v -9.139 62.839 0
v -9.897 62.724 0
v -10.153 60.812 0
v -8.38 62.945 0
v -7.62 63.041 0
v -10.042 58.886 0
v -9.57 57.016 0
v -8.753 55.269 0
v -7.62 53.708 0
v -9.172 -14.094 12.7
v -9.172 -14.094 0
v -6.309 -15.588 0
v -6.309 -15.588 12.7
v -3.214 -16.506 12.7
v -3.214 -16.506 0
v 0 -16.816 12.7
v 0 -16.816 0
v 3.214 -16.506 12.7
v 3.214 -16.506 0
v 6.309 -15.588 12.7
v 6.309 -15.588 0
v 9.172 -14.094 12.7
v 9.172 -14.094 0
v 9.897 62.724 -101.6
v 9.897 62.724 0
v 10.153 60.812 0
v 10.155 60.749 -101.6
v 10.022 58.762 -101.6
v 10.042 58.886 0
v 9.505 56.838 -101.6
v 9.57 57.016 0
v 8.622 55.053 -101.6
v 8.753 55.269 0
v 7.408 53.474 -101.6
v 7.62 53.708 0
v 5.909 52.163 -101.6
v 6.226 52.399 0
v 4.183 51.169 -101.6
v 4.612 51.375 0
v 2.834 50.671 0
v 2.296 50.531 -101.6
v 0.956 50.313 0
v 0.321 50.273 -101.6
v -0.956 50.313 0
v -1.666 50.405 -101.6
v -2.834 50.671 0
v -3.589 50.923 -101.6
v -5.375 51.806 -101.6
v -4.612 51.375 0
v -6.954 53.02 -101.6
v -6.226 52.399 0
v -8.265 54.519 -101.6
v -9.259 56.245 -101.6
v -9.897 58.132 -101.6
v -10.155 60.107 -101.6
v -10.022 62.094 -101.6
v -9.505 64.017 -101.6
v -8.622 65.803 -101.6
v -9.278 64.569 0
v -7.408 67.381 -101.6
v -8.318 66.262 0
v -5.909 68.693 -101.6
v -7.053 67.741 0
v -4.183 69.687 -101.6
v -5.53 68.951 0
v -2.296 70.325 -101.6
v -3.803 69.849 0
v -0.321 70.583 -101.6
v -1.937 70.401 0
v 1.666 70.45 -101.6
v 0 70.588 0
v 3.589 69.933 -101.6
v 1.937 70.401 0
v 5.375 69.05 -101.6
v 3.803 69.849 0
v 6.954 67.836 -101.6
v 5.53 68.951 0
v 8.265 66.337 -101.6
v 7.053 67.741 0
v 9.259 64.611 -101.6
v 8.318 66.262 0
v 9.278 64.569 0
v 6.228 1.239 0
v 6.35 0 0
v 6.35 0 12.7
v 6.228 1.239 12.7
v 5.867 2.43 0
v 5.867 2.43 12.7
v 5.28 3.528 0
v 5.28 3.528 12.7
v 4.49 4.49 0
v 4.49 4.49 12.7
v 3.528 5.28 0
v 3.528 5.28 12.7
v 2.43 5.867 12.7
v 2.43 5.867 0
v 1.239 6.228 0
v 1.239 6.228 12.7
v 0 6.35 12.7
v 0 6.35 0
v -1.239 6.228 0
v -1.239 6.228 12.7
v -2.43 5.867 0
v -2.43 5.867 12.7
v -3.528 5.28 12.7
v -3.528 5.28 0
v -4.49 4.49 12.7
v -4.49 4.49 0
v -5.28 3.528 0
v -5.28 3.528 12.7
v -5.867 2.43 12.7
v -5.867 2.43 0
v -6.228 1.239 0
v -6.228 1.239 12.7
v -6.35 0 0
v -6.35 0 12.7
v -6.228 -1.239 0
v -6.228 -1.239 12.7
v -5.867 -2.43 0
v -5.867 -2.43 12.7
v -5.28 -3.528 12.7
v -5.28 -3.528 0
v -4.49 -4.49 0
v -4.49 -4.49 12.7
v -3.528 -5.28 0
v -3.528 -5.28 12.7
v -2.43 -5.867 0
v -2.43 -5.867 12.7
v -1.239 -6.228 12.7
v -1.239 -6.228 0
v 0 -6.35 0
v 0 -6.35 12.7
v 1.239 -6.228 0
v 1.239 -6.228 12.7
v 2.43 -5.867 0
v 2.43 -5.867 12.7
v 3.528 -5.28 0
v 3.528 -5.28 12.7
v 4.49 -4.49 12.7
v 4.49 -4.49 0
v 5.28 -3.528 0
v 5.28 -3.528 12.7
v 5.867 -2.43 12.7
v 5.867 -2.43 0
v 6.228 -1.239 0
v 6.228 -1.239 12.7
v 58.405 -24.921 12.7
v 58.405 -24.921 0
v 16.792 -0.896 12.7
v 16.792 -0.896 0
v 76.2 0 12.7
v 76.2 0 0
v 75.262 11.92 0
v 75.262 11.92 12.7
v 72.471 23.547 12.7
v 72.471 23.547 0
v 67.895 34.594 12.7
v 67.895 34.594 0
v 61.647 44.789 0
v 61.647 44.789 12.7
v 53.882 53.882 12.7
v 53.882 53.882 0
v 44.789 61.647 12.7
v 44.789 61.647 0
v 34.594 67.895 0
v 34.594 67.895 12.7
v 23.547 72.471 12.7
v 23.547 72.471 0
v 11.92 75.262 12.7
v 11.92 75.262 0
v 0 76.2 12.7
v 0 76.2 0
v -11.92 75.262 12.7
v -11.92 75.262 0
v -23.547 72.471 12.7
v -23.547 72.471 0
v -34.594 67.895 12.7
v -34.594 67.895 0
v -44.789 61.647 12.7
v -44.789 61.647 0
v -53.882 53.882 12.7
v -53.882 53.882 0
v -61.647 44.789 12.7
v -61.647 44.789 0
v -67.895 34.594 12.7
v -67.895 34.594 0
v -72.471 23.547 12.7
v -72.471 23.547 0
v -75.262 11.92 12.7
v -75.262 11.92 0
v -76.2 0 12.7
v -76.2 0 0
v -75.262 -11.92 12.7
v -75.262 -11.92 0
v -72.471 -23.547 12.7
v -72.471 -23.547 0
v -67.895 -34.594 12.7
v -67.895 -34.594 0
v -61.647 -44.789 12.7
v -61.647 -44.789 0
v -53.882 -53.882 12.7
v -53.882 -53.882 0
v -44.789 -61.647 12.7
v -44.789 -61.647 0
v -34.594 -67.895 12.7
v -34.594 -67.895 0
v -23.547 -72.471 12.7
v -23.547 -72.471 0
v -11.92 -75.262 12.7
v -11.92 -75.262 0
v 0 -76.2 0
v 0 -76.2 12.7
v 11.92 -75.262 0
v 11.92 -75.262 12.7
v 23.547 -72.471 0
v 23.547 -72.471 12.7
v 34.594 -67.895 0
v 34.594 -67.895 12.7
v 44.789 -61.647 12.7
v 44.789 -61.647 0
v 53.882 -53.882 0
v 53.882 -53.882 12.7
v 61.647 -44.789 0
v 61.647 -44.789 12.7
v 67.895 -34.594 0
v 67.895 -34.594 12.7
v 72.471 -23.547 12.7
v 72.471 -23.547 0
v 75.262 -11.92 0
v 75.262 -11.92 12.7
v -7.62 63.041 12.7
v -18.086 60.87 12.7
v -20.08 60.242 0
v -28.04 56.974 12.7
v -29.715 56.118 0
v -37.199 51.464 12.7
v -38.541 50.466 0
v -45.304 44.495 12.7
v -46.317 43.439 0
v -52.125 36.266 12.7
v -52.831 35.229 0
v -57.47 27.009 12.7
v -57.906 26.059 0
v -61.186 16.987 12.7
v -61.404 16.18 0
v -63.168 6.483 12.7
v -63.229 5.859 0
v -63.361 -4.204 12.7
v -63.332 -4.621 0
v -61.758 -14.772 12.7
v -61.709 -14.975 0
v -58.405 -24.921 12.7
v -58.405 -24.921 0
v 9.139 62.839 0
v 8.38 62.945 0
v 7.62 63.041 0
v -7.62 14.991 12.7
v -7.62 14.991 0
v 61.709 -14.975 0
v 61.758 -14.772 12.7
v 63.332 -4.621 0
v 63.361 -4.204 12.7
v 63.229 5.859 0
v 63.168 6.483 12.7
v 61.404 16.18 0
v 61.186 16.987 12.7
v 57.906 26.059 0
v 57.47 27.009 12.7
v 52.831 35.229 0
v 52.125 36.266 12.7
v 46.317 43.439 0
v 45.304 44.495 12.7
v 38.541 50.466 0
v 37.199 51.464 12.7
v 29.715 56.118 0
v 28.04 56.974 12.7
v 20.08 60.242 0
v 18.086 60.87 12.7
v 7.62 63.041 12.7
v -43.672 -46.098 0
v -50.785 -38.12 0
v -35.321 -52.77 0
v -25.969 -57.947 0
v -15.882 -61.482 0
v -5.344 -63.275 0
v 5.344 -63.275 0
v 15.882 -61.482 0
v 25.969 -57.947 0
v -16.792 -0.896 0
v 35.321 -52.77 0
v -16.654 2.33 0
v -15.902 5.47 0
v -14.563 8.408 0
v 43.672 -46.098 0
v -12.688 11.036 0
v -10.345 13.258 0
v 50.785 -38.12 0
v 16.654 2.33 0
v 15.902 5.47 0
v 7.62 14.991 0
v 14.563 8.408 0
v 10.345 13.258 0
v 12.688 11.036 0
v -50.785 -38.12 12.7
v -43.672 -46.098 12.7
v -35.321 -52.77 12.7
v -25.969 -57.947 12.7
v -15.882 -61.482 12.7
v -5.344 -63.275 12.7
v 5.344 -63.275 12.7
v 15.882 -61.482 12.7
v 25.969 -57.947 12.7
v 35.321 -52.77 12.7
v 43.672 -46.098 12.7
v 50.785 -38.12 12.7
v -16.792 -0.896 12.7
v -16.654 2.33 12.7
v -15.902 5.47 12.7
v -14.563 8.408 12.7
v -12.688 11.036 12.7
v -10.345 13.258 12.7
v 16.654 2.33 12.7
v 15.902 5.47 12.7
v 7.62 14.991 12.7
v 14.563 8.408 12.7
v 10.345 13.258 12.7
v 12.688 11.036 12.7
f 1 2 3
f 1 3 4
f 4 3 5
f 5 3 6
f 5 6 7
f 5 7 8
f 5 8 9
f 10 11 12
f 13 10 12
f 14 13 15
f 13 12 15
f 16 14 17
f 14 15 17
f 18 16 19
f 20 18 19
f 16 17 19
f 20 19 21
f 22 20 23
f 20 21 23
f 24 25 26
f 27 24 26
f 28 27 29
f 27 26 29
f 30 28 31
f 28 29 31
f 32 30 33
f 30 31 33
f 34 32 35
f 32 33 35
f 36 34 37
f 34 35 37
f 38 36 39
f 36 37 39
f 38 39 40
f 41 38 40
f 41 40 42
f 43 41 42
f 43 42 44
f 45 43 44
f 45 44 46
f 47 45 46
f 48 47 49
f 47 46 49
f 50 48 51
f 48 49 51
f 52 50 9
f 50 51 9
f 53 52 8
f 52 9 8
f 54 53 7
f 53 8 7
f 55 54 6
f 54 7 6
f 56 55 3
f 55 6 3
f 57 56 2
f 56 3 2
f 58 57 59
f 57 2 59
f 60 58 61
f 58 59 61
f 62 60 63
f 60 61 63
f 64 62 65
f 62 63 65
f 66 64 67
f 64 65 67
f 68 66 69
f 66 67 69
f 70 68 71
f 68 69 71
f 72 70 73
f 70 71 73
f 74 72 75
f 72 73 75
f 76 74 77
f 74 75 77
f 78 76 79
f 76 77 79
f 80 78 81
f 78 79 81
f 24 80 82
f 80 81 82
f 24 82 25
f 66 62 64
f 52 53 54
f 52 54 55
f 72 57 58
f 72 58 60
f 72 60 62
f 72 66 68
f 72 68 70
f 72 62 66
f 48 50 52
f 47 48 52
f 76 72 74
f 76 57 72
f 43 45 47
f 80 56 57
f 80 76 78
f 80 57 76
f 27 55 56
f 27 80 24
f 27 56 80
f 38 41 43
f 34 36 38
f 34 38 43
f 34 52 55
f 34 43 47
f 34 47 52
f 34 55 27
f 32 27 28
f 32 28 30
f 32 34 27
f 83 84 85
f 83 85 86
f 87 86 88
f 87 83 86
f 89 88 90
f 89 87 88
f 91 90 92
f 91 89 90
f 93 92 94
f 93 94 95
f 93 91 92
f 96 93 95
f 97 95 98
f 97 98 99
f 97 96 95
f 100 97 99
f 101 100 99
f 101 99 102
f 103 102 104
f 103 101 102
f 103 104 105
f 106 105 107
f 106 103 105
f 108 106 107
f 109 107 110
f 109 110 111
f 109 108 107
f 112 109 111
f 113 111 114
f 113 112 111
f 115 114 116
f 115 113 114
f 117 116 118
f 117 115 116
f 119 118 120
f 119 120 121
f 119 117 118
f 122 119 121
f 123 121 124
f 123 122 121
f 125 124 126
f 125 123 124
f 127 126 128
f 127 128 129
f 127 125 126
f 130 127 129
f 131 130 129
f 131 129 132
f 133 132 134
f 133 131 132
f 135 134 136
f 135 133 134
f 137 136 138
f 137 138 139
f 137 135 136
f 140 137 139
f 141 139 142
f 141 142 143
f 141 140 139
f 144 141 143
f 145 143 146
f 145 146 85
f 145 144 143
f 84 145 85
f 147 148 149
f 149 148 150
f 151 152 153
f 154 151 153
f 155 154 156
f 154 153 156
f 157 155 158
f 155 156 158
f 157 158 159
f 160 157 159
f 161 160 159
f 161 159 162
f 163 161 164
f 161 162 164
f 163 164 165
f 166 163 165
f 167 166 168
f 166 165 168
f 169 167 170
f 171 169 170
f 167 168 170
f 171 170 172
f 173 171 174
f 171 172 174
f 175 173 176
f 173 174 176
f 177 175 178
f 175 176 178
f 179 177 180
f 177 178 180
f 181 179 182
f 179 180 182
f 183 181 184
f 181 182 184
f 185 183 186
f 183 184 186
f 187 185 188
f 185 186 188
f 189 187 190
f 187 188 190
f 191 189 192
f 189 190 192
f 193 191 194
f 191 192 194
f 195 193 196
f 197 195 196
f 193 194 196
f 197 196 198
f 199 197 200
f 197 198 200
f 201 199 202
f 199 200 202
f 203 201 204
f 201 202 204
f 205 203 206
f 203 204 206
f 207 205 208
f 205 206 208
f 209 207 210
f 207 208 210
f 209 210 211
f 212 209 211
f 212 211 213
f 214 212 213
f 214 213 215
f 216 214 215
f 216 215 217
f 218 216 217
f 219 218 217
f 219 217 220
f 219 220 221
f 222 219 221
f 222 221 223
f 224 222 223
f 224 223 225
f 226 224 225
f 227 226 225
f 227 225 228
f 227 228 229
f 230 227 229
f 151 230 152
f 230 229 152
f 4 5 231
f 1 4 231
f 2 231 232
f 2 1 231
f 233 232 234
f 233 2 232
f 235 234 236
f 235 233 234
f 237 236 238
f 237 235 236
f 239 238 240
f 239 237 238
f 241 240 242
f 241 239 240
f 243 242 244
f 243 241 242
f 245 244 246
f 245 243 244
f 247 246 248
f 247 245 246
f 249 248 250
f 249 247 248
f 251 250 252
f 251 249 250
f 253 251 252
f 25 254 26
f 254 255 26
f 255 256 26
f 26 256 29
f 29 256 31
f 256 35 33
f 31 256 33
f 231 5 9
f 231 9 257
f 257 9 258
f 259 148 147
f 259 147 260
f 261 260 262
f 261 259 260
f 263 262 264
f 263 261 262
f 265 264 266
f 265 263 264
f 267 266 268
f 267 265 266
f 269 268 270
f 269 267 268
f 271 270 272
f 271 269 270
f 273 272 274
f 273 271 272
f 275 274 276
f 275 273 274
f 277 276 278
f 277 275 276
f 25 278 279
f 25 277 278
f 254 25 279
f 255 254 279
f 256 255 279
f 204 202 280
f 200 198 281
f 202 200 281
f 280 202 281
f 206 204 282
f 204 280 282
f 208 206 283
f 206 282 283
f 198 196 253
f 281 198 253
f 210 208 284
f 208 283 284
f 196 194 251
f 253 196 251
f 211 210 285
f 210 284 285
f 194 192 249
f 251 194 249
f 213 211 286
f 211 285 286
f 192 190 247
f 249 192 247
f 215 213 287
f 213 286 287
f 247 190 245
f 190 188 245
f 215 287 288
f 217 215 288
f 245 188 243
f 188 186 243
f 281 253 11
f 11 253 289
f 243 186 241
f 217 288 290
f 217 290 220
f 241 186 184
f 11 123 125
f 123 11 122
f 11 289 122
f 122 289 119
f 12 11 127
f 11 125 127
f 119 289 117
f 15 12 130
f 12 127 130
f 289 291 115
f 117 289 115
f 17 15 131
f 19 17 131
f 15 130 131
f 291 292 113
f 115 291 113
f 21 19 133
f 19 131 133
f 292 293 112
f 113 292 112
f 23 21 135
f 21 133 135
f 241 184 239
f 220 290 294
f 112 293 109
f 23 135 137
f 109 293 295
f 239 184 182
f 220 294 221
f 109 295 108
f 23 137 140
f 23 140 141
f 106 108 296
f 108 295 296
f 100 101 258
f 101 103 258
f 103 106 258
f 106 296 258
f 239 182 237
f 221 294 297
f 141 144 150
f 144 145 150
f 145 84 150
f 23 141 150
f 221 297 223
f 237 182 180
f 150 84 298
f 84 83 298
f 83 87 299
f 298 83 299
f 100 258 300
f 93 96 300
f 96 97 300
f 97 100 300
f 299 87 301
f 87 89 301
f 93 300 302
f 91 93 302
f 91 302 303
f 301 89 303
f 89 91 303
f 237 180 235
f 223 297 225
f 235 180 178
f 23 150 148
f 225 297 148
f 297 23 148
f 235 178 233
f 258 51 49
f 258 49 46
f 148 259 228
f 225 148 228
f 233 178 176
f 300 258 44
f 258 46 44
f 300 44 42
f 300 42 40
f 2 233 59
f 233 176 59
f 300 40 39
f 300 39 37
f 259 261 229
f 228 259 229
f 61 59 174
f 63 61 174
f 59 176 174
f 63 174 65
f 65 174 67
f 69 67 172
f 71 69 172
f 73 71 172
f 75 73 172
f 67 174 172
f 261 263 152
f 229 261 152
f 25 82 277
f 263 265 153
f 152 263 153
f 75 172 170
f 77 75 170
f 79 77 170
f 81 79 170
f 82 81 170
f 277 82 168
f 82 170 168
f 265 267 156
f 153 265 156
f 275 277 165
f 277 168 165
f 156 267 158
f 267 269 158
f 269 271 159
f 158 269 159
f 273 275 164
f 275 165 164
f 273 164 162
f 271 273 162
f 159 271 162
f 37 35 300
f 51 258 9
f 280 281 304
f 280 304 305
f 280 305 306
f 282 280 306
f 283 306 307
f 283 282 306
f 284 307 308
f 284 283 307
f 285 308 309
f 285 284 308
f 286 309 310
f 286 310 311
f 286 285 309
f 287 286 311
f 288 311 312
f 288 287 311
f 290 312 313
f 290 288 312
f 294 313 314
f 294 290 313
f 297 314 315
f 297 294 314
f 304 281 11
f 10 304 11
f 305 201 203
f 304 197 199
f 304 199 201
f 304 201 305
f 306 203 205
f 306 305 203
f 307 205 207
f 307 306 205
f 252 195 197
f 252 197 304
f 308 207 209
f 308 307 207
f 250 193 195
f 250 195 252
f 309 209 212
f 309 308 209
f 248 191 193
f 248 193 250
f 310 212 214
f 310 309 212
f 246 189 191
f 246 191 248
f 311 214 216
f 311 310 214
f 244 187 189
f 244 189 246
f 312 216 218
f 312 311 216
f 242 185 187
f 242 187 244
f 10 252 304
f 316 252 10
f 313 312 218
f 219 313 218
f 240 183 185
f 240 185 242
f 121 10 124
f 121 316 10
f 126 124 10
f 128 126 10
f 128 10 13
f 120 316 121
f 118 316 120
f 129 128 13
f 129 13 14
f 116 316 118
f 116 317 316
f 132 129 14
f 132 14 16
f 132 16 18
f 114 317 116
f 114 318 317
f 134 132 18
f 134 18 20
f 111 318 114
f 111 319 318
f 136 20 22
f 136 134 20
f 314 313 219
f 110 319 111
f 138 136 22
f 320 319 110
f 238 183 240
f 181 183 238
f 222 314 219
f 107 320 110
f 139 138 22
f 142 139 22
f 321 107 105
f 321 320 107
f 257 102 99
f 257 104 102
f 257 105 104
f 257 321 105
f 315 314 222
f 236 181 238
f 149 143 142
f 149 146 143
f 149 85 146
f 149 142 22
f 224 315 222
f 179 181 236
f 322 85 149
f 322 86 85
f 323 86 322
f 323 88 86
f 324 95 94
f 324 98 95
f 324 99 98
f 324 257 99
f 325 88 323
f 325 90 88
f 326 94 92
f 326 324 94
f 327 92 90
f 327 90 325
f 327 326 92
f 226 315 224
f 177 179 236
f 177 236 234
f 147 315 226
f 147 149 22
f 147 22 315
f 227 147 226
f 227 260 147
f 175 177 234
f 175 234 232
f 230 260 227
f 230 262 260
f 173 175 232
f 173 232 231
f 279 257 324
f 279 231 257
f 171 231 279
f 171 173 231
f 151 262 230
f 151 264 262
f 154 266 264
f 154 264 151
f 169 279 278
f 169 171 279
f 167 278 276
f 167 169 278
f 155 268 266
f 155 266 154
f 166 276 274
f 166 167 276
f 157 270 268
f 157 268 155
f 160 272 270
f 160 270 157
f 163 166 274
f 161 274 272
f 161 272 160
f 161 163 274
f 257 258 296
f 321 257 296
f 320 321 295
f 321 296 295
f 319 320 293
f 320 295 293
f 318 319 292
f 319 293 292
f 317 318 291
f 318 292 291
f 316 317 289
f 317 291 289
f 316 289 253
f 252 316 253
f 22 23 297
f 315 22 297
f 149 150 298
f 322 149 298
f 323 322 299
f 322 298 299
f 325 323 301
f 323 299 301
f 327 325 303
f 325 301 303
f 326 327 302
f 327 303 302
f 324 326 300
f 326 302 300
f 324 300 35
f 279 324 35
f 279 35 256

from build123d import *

# Parameters (mm, degrees)
SKETCH1_R           = 76.2
SKETCH1_R_2         = 63.5
SKETCH1_R_3         = 16.816105372
SKETCH1_R_4         = 6.35
BOSS_EXTRUDE1_DEPTH = 12.7
SKETCH2_R           = 10.16
BOSS_EXTRUDE2_DEPTH = 101.6


with BuildPart() as part:
    # Sketch1 → Boss-Extrude1 (new body)
    # profile 1 of 6: a face of its own
    with BuildSketch(Plane.XY):
        Circle(SKETCH1_R)
        Circle(SKETCH1_R_2, mode=Mode.SUBTRACT)
    # profile 2 of 6: a face of its own
    with BuildSketch(Plane.XY):
        with BuildLine():
            ThreePointArc((-7.62, 14.990563695), (-3.917811966, 16.353352845), (0, 16.816105372))
            Line((0, 16.816105372), (0, 63.5))
            ThreePointArc((0, 63.5), (-3.816901576, 63.385181725), (-7.62, 63.041142122))
            Line((-7.62, 63.041142122), (-7.62, 14.990563695))
        make_face()
    # profile 3 of 6: a face of its own
    with BuildSketch(Plane.XY):
        with BuildLine():
            Line((0, 63.5), (0, 16.816105372))
            ThreePointArc((0, 16.816105372), (3.917811966, 16.353352845), (7.62, 14.990563695))
            Line((7.62, 14.990563695), (7.62, 63.041142122))
            ThreePointArc((7.62, 63.041142122), (3.816901576, 63.385181725), (0, 63.5))
        make_face()
    # profile 4 of 6: a face of its own
    with BuildSketch(Plane.XY):
        with BuildLine():
            ThreePointArc((-9.172208976, -14.094395424), (-14.563174445, -8.408052686), (-16.792208976, -0.89616827))
            Line((-16.792208976, -0.89616827), (-58.405230561, -24.921457484))
            ThreePointArc((-58.405230561, -24.921457484), (-54.99261314, -31.75), (-50.785230561, -38.119684638))
            Line((-50.785230561, -38.119684638), (-9.172208976, -14.094395424))
        make_face()
    # profile 5 of 6: a face of its own
    with BuildSketch(Plane.XY):
        with BuildLine():
            Line((58.405230561, -24.921457484), (16.792208976, -0.89616827))
            ThreePointArc((16.792208976, -0.89616827), (14.563174445, -8.408052686), (9.172208976, -14.094395424))
            Line((9.172208976, -14.094395424), (50.785230561, -38.119684638))
            ThreePointArc((50.785230561, -38.119684638), (54.99261314, -31.75), (58.405230561, -24.921457484))
        make_face()
    # profile 6 of 6: a face of its own
    with BuildSketch(Plane.XY):
        Circle(SKETCH1_R_3)
        Circle(SKETCH1_R_4, mode=Mode.SUBTRACT)
    extrude(amount=BOSS_EXTRUDE1_DEPTH)

    # Sketch2 → Boss-Extrude2 (add)
    with BuildSketch(Plane(origin=(0, 0, 0), x_dir=(-1, 0, 0), z_dir=(0, 0, -1))):
        with Locations(Location((0, 60.427828817, 0), (0, 0, 166.938408153))):
            Circle(SKETCH2_R)
    extrude(amount=BOSS_EXTRUDE2_DEPTH)


solid = part.part
